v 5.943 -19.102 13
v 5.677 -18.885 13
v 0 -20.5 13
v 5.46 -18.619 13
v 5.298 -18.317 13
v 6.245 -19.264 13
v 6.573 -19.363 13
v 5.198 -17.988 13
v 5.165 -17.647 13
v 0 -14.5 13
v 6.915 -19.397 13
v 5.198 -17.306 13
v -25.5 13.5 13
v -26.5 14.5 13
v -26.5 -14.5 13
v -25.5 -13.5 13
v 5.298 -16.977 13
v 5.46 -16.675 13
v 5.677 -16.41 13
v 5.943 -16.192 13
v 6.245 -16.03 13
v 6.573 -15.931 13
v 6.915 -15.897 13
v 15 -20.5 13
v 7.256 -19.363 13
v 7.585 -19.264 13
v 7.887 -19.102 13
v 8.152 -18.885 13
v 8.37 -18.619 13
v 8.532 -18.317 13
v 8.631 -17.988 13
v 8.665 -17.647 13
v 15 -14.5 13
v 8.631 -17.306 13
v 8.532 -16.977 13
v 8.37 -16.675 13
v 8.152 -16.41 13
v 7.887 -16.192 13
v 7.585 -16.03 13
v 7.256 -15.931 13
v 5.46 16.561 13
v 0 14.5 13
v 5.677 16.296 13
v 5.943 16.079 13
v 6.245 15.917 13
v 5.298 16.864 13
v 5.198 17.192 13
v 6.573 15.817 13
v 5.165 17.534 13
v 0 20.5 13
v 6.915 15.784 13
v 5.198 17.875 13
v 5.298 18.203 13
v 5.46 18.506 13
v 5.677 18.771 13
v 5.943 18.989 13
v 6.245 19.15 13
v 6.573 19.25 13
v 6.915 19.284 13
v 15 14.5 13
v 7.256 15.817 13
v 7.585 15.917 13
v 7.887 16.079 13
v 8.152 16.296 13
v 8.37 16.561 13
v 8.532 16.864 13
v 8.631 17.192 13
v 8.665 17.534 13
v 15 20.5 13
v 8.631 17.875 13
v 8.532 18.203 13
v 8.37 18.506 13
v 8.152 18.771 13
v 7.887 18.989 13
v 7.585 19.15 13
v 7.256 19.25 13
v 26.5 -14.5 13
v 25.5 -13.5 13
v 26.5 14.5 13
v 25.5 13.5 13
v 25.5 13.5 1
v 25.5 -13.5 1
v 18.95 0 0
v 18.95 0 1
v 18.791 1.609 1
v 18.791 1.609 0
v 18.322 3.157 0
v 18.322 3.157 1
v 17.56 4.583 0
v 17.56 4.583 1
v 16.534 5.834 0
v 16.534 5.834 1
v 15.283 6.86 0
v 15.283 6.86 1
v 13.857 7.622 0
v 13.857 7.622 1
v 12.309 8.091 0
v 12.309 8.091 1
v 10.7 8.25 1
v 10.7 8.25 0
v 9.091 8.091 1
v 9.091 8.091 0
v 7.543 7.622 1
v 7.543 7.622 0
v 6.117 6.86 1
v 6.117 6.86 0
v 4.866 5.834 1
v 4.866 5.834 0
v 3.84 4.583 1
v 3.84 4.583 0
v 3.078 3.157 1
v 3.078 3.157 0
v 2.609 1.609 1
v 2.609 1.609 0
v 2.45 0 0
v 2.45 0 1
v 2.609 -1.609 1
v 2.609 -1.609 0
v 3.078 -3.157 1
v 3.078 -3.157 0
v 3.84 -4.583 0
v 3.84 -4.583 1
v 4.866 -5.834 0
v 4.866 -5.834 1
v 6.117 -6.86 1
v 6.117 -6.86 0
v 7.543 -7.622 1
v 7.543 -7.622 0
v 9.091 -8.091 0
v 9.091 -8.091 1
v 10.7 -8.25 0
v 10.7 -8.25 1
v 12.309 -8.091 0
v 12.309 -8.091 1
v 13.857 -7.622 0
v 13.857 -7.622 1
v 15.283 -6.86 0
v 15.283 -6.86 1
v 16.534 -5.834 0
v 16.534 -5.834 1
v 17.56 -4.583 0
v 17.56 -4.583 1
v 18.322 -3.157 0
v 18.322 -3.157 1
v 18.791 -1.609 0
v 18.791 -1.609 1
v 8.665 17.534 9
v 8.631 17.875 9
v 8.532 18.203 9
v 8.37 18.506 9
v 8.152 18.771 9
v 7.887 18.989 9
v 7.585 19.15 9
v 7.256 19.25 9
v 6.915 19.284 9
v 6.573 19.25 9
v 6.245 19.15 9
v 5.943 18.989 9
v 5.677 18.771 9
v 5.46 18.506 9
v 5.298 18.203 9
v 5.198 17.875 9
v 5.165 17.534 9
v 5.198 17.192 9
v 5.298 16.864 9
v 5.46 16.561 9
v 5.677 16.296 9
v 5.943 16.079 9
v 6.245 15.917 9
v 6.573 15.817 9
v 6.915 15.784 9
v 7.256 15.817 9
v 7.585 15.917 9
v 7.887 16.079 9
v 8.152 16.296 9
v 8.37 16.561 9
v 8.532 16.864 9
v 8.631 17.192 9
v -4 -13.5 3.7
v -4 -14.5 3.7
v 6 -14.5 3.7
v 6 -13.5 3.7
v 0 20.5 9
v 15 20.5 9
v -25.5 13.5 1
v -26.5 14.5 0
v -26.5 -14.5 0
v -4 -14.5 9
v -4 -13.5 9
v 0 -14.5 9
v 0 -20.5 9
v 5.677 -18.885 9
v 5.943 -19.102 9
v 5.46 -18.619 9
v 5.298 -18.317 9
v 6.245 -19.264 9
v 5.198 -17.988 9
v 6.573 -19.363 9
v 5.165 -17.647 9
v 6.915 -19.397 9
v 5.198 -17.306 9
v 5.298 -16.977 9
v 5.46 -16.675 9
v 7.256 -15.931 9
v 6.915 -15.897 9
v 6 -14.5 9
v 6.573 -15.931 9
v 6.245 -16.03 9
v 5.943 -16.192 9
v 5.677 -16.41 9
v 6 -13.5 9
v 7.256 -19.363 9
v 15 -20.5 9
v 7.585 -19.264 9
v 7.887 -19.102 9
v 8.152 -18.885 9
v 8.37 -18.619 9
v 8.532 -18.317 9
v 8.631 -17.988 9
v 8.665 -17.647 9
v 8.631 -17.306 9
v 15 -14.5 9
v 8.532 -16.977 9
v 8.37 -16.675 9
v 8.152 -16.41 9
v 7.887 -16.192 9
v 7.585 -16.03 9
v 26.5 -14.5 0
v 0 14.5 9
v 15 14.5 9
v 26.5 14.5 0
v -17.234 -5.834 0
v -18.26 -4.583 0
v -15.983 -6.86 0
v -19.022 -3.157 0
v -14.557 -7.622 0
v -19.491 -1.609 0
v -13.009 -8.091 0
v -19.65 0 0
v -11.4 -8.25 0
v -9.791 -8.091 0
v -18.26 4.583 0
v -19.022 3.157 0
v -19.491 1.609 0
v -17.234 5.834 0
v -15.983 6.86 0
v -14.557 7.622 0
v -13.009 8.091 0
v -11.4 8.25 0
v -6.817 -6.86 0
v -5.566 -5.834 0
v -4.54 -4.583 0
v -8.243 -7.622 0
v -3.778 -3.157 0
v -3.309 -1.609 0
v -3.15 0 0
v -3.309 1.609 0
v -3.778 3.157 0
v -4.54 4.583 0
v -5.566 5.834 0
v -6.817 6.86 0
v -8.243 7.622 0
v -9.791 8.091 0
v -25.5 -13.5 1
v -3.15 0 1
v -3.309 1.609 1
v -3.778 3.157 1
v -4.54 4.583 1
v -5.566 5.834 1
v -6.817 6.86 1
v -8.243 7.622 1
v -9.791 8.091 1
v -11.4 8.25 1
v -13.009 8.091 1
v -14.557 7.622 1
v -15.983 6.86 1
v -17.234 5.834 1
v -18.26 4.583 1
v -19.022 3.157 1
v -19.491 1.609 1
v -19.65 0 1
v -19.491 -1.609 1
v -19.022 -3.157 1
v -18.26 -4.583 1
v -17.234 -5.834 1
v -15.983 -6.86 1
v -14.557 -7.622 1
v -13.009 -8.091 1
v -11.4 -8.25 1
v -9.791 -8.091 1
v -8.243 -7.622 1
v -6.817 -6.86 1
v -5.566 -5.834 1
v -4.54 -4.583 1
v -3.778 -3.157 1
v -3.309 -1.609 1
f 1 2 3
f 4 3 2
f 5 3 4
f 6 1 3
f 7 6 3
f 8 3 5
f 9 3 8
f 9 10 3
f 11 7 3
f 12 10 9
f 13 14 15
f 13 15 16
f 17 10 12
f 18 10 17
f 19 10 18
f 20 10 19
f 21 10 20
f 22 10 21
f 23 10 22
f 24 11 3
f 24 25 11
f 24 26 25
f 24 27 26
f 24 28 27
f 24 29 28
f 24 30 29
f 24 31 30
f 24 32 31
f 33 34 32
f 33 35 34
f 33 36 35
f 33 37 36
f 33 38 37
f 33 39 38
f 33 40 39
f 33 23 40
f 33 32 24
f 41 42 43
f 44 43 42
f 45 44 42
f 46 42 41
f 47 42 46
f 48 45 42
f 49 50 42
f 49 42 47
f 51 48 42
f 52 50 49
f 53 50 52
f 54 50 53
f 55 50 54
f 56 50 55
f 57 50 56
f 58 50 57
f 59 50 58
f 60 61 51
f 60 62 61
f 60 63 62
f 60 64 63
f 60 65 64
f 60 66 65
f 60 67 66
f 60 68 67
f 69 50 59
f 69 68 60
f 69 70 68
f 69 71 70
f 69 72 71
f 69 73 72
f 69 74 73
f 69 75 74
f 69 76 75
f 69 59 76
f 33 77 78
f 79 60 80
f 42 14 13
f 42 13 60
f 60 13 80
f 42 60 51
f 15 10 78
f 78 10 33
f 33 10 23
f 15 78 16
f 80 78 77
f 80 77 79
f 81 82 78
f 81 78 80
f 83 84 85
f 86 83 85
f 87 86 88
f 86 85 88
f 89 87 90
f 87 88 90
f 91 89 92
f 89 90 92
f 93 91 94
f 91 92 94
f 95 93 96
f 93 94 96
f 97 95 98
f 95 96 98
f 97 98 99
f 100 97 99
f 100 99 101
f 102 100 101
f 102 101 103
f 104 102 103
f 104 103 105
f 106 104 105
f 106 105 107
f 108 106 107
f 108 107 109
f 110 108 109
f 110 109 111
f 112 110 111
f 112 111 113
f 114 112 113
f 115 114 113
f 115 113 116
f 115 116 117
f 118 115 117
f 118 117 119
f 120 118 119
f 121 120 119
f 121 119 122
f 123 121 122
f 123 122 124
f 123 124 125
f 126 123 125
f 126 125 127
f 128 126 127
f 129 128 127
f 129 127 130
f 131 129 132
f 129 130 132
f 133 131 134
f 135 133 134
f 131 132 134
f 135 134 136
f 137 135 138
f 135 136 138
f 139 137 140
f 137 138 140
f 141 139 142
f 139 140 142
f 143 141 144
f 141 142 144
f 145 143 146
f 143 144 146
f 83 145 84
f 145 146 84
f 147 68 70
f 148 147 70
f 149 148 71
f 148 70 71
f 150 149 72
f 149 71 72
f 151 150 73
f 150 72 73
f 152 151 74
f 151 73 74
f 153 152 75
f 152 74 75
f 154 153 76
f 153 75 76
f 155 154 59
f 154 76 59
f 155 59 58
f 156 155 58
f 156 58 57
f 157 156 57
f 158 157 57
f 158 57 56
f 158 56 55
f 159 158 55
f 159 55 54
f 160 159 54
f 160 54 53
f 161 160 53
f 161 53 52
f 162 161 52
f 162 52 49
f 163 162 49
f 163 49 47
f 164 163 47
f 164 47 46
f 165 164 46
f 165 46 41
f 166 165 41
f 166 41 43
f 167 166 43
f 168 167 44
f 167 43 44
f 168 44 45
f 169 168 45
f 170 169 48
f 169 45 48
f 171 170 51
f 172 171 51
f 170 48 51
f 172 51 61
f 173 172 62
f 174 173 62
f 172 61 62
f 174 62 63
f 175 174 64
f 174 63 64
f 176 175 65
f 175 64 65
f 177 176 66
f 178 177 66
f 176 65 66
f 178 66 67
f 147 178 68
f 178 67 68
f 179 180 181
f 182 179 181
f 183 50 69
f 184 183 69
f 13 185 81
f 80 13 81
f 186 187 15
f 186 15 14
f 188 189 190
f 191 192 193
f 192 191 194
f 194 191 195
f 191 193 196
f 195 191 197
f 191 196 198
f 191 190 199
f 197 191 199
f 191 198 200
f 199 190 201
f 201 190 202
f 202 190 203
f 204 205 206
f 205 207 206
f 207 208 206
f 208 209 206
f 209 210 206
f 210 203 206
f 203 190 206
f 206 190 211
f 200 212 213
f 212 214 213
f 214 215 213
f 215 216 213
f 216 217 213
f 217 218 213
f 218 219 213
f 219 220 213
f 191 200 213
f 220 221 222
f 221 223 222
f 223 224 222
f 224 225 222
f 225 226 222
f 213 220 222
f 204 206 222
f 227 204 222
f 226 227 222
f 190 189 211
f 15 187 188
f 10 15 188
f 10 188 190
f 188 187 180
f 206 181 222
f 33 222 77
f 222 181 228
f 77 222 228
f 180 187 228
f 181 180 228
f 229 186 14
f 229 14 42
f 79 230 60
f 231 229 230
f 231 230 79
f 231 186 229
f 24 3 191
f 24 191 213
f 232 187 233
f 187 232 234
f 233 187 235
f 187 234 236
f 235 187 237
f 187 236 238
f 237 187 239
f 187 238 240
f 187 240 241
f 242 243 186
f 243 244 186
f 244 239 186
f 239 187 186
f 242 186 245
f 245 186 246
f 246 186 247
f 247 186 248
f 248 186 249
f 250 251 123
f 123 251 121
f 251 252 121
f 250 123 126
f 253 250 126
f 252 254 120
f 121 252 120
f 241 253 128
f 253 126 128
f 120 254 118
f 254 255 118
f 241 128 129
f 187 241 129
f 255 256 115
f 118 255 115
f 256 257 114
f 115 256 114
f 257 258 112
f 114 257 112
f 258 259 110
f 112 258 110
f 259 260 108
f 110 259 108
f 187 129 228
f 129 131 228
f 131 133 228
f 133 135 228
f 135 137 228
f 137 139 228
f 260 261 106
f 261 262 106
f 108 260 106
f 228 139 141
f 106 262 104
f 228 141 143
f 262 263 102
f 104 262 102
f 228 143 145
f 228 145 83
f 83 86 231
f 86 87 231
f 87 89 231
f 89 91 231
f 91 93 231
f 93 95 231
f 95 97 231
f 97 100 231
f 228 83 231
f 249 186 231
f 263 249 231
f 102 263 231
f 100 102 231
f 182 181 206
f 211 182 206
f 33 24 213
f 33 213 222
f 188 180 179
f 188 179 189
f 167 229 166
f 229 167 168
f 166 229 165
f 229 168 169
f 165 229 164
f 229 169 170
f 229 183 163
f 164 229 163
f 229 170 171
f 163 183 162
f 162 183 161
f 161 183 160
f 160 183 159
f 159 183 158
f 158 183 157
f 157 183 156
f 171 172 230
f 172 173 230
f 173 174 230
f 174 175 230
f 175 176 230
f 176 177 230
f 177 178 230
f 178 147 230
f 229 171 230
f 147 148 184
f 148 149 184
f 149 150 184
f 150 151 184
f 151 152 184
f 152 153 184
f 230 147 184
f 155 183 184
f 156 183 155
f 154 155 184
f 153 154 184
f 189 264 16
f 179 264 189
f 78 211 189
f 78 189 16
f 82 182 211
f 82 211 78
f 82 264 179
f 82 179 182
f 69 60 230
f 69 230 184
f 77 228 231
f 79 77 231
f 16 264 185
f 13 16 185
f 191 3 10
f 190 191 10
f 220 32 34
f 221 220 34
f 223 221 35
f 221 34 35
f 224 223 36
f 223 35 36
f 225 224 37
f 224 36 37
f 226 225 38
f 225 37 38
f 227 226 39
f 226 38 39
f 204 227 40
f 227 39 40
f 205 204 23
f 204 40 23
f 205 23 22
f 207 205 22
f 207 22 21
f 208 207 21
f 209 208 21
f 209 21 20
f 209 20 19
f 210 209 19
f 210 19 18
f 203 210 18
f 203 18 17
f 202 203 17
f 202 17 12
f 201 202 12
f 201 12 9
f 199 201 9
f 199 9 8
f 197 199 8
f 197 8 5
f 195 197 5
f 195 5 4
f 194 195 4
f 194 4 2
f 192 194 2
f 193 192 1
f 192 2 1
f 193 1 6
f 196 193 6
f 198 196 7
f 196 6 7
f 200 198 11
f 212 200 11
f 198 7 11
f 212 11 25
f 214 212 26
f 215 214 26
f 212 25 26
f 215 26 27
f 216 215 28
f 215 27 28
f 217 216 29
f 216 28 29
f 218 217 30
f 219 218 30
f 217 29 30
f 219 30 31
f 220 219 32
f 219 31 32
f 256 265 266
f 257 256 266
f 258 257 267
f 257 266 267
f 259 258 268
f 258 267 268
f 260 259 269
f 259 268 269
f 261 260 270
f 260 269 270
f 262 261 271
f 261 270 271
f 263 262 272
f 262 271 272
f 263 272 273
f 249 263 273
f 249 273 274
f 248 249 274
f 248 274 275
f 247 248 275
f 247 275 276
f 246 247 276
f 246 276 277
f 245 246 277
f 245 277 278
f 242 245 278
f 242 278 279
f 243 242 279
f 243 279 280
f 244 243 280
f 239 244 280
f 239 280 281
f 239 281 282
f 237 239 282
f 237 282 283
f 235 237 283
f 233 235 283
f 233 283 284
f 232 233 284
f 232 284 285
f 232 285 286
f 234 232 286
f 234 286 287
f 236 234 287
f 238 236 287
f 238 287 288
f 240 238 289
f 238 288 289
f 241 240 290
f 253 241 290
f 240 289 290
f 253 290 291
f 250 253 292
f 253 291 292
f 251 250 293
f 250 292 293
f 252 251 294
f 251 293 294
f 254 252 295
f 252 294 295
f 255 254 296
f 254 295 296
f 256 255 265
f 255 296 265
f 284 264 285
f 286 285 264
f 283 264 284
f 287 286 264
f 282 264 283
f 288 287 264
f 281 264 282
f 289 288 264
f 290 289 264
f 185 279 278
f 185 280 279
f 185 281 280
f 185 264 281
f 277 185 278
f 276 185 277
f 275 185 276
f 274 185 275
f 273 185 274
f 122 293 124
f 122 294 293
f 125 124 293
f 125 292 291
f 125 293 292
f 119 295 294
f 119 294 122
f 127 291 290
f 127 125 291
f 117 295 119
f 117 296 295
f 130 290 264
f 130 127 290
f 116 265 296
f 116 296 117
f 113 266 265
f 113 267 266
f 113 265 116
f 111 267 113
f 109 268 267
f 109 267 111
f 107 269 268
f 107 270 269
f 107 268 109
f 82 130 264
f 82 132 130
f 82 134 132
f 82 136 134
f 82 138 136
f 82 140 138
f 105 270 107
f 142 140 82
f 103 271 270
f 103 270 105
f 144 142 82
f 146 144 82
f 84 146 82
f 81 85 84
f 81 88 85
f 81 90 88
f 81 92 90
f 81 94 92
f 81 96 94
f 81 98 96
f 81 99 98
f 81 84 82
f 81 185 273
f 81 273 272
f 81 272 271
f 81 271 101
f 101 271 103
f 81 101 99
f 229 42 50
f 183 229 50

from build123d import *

# Parameters (mm, degrees)
SKETCH1_W           = 53
SKETCH1_H           = 29
BOSS_EXTRUDE2_DEPTH = 13
SHELL5_T            = -1
SKETCH3_R           = 8.25
CUT_EXTRUDE1_DEPTH  = 13
SKETCH4_W           = 10
SKETCH4_H           = 5.3
CUT_EXTRUDE2_DEPTH  = 13
SKETCH5_W           = 15
SKETCH5_H           = 6
BOSS_EXTRUDE3_DEPTH = 4
SKETCH6_R           = 1.75
CUT_EXTRUDE3_DEPTH  = 6


with BuildPart() as part:
    # Sketch1 → Boss-Extrude2 (new body)
    with BuildSketch(Plane.XY):
        Rectangle(SKETCH1_W, SKETCH1_H)
    extrude(amount=BOSS_EXTRUDE2_DEPTH)

    # Shell5
    shell5_openings = [part.faces().sort_by_distance(p)[0] for p in [
        (0, 0, 13),
    ]]
    offset(amount=SHELL5_T, openings=shell5_openings, kind=Kind.INTERSECTION)

    # Sketch3 → Cut-Extrude1 (cut)
    with BuildSketch(Plane.XY.offset(1)):
        with Locations((-11.4, 0)):
            Circle(SKETCH3_R)
        with Locations((10.7, 0)):
            Circle(SKETCH3_R)
    extrude(amount=-CUT_EXTRUDE1_DEPTH, mode=Mode.SUBTRACT)

    # Sketch4 → Cut-Extrude2 (cut)
    with BuildSketch(Plane.XZ.offset(14.5)):
        with Locations((1, 6.35)):
            Rectangle(SKETCH4_W, SKETCH4_H)
    extrude(amount=-CUT_EXTRUDE2_DEPTH, mode=Mode.SUBTRACT)

    # Sketch5 → Boss-Extrude3 (add)
    with BuildSketch(Plane.XY.offset(13)):
        with Locations((7.5, 17.5)):
            Rectangle(SKETCH5_W, SKETCH5_H)
        with Locations((7.5, -17.5)):
            Rectangle(SKETCH5_W, SKETCH5_H)
    extrude(amount=-BOSS_EXTRUDE3_DEPTH)

    # Sketch6 → Cut-Extrude3 (cut)
    with BuildSketch(Plane.XY.offset(13)):
        with Locations((6.914840987, 17.533686801)):
            Circle(SKETCH6_R)
        with Locations((6.914840987, -17.647083132)):
            Circle(SKETCH6_R)
    extrude(amount=-CUT_EXTRUDE3_DEPTH, mode=Mode.SUBTRACT)


solid = part.part
